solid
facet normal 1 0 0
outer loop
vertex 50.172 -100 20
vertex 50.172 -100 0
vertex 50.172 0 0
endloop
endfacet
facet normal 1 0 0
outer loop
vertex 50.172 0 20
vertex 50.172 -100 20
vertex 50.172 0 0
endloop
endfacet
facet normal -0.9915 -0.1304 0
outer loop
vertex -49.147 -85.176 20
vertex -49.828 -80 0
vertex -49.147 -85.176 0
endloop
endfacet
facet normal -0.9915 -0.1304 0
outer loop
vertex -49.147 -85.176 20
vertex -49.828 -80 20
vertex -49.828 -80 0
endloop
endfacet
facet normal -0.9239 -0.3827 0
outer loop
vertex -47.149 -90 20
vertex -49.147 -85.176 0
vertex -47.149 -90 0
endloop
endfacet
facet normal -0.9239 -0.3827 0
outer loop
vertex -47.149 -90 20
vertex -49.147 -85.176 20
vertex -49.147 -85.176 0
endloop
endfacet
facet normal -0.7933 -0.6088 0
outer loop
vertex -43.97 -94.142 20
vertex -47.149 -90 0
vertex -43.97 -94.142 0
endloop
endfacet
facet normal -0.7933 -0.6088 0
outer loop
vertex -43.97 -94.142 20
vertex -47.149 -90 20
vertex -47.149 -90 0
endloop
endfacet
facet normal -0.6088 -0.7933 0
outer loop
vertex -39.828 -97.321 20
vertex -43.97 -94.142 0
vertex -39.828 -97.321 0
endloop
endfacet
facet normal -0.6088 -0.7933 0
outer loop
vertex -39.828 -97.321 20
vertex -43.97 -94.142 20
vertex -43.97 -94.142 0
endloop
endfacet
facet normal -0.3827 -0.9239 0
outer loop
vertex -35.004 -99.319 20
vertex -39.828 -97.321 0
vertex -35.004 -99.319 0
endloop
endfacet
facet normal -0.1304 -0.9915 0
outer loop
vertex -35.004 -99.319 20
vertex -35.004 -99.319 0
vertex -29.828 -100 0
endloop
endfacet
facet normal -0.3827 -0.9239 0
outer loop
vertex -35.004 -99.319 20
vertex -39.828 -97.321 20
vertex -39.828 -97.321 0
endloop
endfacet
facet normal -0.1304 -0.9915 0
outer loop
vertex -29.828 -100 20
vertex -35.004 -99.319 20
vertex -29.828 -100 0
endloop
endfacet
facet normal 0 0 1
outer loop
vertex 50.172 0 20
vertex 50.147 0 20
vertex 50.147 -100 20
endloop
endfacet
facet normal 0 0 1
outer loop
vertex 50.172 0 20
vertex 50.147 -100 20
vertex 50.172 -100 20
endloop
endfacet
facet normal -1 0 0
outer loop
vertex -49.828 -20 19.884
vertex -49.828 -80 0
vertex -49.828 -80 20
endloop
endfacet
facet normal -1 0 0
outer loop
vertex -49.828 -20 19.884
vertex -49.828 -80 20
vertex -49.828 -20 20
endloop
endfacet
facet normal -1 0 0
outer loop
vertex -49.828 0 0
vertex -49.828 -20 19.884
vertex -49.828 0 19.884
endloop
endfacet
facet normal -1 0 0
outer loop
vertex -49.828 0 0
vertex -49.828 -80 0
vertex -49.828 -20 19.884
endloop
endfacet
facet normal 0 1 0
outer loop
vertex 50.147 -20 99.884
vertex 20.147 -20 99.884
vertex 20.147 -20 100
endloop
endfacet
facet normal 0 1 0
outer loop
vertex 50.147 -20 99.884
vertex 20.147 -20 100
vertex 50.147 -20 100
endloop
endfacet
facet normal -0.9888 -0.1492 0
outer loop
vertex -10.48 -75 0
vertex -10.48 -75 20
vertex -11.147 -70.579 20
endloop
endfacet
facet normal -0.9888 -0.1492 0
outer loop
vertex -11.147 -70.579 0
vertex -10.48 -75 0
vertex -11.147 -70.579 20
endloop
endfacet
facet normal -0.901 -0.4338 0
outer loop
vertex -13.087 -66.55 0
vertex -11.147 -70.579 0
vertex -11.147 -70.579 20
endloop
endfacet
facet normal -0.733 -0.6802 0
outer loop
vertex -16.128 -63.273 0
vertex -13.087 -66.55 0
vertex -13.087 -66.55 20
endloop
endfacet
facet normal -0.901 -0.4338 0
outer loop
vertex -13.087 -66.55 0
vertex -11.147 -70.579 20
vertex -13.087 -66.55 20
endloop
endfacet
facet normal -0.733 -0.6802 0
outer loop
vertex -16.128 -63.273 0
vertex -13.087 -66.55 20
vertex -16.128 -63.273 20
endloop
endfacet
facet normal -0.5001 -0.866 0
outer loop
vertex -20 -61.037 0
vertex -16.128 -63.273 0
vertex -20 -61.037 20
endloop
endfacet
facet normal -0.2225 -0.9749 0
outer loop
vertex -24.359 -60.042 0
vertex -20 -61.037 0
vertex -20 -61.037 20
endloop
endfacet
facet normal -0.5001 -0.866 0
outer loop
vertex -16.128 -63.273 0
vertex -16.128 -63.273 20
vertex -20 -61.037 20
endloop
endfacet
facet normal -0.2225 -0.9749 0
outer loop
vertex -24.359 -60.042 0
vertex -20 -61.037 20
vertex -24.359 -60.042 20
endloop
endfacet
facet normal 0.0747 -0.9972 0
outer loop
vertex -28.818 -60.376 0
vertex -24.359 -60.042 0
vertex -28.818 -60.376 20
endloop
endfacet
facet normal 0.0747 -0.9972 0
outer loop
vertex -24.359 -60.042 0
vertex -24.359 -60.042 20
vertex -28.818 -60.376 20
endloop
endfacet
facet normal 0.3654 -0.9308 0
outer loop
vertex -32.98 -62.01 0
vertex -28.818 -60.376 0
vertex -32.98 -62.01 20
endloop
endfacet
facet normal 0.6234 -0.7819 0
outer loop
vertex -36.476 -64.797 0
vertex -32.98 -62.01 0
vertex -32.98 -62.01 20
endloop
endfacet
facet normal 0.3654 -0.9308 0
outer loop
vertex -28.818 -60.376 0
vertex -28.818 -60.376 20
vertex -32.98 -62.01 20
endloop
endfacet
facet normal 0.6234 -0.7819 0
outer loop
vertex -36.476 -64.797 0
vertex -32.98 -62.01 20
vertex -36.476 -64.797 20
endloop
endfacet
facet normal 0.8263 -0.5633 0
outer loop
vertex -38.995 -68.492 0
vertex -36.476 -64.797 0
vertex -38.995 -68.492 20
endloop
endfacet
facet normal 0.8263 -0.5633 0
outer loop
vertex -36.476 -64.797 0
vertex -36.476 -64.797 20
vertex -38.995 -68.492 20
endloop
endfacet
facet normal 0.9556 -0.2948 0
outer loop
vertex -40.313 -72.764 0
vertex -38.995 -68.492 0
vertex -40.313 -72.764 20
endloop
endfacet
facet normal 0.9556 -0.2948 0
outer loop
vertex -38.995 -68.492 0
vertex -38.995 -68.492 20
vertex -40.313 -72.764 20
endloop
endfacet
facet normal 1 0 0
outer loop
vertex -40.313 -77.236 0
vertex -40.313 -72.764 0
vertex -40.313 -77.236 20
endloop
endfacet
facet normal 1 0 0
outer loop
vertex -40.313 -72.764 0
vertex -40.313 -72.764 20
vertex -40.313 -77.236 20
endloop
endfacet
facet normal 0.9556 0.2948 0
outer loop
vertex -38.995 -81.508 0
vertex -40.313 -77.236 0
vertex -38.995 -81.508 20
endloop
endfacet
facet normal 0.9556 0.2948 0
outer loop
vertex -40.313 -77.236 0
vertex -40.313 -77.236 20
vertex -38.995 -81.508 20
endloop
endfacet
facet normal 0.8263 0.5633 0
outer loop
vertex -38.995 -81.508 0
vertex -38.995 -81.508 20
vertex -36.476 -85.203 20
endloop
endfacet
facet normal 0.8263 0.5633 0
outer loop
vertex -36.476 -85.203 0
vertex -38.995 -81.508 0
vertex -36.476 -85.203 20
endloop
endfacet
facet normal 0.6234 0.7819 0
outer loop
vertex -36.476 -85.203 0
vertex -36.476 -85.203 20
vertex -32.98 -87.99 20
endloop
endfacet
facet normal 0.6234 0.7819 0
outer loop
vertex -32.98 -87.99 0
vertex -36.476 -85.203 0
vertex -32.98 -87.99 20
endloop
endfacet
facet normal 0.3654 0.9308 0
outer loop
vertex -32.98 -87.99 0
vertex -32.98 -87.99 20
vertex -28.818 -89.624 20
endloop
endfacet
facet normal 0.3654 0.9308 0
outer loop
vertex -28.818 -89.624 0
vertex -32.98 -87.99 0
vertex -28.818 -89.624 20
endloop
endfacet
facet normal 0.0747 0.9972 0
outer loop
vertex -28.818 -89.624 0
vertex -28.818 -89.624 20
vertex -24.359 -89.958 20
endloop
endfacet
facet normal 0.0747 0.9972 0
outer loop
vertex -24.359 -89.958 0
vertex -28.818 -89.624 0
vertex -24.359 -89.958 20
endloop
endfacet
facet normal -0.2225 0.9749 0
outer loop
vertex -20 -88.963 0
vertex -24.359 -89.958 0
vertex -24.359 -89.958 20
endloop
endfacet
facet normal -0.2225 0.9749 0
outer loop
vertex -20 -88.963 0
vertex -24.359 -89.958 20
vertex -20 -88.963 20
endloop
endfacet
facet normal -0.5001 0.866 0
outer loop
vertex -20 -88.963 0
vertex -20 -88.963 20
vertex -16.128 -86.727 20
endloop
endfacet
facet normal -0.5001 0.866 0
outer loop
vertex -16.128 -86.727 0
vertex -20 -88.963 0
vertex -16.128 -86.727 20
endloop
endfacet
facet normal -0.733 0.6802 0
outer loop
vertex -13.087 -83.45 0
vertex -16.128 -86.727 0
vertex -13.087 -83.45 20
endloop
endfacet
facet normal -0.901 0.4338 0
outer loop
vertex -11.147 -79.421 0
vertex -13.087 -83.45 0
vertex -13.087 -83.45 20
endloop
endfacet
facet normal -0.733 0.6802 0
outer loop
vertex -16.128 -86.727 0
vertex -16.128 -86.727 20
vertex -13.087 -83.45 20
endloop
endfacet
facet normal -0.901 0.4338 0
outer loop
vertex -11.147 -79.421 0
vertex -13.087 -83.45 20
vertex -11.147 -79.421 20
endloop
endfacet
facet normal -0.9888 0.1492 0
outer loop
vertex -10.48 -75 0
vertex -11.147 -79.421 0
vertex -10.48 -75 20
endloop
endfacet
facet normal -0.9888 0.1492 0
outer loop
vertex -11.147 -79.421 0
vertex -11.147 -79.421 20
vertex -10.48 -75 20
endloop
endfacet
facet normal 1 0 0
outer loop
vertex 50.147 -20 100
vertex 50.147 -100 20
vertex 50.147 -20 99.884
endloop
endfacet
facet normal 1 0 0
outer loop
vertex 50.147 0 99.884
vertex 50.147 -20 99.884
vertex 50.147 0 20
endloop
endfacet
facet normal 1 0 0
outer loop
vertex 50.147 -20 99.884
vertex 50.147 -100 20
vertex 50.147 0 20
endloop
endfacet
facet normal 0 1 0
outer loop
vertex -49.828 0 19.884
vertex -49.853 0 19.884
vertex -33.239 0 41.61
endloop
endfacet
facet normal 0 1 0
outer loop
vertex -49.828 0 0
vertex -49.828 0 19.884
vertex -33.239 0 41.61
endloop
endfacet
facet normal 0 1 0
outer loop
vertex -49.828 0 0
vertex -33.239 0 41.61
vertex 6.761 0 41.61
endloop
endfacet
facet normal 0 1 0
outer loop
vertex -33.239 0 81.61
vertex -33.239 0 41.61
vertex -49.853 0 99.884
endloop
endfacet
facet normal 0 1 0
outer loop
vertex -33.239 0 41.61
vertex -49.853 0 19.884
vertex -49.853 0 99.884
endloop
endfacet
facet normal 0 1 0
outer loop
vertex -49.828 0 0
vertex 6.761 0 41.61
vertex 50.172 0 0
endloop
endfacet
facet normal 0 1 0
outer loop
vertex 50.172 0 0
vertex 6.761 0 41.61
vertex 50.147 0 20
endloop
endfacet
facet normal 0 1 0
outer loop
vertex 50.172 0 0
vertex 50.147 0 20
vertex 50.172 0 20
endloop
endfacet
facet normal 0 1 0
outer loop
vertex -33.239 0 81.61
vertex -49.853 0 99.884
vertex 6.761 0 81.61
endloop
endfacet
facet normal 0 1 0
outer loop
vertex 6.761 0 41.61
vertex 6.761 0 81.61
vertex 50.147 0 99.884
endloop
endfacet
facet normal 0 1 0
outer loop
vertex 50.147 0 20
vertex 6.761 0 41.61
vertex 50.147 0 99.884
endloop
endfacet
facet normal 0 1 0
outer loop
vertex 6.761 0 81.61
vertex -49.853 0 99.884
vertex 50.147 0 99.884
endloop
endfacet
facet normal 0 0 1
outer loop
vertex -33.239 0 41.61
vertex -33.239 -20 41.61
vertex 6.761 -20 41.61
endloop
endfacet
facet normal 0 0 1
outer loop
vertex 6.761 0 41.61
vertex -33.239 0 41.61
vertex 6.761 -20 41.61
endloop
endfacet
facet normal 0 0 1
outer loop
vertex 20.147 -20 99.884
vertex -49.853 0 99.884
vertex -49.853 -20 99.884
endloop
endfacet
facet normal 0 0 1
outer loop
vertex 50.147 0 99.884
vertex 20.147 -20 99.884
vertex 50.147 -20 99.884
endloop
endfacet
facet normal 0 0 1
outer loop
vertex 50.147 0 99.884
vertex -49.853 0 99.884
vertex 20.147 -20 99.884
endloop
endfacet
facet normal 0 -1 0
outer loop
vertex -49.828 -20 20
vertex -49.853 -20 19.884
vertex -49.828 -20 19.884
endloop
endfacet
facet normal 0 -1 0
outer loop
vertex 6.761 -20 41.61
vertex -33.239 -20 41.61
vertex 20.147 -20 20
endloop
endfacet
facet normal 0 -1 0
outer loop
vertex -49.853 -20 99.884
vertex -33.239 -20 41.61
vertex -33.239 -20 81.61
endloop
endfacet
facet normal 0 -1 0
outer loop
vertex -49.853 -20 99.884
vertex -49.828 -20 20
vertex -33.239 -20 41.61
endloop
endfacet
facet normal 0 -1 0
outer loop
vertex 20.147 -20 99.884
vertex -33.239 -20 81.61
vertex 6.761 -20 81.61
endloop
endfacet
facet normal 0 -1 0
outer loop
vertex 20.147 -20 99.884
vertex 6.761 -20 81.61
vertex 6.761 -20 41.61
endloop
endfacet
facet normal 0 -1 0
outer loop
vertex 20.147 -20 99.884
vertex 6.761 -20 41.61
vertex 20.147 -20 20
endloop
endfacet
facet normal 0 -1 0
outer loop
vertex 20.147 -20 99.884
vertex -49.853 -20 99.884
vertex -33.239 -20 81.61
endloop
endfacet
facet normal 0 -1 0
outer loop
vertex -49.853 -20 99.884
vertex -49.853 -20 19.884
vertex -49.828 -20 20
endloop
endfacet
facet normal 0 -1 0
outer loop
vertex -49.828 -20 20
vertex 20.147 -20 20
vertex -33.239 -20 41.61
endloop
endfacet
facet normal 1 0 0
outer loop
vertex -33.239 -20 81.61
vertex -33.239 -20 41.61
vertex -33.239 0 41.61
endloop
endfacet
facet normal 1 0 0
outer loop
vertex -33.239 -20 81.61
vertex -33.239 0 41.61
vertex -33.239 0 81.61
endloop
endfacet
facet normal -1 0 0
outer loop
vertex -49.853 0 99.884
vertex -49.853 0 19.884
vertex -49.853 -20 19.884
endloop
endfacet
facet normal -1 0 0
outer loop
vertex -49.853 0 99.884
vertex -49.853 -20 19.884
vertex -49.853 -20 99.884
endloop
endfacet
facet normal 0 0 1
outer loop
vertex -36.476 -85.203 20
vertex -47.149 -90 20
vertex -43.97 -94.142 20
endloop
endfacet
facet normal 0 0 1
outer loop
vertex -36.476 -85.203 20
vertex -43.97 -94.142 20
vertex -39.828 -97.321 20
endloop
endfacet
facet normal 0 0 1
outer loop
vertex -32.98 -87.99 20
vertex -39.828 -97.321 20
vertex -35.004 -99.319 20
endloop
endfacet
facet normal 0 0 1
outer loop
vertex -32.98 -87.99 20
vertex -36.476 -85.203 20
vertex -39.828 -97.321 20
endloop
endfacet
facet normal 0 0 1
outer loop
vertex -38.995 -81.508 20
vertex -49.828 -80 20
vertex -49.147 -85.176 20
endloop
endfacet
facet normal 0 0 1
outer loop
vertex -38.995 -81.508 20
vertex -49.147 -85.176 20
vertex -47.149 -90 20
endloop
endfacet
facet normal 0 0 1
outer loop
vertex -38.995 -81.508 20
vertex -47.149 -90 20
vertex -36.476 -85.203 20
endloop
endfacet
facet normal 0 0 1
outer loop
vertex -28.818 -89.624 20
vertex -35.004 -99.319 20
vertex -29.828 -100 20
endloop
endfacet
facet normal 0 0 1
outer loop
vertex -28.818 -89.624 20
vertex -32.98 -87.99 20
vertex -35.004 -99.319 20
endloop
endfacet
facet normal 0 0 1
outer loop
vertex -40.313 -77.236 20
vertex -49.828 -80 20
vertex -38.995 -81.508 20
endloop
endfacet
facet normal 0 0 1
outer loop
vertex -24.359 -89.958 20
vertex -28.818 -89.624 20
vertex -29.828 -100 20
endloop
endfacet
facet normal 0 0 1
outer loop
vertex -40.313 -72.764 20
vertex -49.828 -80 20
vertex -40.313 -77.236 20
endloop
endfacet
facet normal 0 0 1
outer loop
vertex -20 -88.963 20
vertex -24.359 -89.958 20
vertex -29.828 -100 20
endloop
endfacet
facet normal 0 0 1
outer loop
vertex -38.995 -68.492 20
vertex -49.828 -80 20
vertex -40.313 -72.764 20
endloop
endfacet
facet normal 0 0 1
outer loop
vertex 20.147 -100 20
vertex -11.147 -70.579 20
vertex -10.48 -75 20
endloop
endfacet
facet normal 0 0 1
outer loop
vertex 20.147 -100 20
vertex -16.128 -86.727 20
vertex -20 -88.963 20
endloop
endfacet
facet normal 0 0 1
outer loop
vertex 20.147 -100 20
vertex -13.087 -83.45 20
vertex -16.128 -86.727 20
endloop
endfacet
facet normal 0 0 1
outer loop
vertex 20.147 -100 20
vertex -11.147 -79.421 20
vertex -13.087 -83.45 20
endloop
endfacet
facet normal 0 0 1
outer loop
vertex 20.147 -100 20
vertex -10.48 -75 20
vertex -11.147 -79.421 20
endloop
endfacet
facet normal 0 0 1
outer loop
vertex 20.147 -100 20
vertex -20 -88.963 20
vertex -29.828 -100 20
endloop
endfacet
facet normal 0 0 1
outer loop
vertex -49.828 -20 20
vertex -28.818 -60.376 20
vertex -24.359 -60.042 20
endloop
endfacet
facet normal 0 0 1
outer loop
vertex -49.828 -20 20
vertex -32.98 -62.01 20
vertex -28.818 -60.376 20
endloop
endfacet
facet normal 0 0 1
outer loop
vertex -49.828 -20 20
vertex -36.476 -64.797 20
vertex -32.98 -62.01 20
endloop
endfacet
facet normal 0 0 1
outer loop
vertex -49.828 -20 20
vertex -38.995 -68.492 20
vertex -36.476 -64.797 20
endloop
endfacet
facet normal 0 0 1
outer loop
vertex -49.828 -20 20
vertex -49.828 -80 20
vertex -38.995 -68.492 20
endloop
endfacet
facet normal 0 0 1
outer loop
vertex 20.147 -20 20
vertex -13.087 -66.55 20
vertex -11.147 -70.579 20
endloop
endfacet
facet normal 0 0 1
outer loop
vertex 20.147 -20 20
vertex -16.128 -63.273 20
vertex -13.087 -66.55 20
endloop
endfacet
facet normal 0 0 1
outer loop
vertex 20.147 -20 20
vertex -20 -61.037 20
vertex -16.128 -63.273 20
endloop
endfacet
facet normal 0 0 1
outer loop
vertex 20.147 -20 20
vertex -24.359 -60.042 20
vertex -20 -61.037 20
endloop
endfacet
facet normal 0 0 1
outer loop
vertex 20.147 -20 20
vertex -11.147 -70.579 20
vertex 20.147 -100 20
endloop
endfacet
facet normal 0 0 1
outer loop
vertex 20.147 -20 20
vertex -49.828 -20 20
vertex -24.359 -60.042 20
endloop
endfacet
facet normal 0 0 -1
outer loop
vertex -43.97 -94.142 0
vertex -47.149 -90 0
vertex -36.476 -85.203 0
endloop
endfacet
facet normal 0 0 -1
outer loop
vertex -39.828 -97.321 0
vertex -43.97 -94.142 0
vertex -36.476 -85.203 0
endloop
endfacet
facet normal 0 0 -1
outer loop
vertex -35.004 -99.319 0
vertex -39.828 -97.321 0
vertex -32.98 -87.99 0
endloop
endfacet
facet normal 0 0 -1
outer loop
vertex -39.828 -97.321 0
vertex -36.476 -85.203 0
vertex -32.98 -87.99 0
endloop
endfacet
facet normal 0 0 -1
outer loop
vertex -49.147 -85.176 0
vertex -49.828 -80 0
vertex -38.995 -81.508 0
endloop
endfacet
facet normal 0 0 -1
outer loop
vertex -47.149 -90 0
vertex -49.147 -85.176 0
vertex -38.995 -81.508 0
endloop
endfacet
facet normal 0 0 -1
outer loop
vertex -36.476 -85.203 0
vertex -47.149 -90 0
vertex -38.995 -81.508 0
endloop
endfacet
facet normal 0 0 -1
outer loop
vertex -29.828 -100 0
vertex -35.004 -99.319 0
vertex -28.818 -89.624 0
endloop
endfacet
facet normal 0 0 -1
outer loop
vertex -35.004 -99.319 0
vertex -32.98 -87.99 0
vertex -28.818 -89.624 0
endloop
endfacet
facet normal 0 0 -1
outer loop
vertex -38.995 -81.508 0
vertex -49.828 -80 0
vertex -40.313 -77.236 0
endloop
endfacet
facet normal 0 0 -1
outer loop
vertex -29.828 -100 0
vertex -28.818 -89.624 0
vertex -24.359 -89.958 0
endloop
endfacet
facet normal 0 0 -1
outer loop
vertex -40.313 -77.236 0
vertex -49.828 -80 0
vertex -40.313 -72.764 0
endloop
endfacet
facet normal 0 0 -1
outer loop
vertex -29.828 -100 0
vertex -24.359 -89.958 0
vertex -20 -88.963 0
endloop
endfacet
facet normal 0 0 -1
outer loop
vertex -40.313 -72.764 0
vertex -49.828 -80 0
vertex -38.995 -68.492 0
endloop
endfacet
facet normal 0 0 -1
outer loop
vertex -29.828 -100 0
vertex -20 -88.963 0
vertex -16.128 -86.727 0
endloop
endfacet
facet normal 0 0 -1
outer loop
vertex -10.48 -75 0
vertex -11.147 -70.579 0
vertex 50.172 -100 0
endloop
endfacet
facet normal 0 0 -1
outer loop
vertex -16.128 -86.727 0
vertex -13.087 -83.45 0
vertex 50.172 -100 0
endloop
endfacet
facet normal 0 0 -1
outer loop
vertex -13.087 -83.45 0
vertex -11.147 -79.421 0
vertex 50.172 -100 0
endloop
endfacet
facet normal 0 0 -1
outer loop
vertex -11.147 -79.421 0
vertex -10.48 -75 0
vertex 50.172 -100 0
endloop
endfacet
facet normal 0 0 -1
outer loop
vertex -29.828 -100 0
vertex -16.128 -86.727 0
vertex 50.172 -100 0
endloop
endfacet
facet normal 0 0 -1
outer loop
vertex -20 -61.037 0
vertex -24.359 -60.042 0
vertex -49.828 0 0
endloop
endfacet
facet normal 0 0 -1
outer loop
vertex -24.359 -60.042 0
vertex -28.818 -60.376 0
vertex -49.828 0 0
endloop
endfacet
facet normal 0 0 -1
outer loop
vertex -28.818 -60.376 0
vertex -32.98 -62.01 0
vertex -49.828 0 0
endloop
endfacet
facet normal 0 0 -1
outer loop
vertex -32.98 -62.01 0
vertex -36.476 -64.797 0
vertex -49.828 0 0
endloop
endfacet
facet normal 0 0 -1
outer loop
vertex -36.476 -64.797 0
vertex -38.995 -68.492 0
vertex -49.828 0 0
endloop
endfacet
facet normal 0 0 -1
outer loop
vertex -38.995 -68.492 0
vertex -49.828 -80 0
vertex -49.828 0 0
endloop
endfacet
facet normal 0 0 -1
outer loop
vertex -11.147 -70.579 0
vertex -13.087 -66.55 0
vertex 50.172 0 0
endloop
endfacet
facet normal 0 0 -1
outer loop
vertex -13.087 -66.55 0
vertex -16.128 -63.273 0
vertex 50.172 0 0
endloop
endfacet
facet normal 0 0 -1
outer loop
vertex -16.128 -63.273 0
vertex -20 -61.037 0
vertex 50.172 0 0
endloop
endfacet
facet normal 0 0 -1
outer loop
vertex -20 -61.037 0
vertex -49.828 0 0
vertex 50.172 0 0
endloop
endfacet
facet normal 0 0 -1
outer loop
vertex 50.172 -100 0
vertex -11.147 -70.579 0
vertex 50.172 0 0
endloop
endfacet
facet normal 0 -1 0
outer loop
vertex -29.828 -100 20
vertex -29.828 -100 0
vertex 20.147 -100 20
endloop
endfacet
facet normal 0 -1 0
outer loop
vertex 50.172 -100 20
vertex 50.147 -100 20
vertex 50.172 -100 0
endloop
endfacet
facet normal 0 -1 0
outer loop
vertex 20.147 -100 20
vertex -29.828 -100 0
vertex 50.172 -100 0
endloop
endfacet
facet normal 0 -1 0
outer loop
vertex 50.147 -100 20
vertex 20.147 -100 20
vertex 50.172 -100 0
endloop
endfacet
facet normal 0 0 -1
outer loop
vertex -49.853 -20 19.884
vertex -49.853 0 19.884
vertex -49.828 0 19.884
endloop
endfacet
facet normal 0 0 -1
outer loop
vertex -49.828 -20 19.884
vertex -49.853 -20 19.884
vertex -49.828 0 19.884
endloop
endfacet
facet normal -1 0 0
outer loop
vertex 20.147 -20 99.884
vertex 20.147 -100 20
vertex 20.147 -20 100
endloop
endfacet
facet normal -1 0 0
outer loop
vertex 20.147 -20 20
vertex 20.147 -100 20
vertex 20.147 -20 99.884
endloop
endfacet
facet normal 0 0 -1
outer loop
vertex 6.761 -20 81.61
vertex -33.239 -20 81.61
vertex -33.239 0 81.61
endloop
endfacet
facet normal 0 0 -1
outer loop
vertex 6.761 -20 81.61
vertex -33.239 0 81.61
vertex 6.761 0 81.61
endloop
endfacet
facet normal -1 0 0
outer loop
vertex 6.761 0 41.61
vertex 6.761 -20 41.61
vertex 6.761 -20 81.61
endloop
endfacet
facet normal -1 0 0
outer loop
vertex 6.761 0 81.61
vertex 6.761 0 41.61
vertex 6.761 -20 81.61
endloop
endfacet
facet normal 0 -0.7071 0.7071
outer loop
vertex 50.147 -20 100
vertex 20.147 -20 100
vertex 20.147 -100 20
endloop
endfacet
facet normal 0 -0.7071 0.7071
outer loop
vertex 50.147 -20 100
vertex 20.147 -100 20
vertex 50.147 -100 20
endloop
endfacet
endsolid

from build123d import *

# Parameters (mm, degrees)
F0_W      = 100
F0_H      = 100
F1_DEPTH  = 20
F2_W      = 100
F2_H      = 80
F3_DEPTH  = 20
F4_W      = 30
F4_H      = 80
F5_DEPTH  = 80
F6_R      = 20
F7_R      = 15
F8_DEPTH  = 20
F9_W      = 40
F9_H      = 40
F10_DEPTH = 20
F11_SIZE  = 79.99999


# Not quite as in the source:
# - a fillet or chamfer is up to 0.001 mm smaller than in the source, because OpenCascade refuses the exact size


with BuildPart() as f1:
    # F0 (on Top) → F1 (new body)
    with BuildSketch(Plane.XY):
        with Locations((0.1719114778, -50)):
            Rectangle(F0_W, F0_H)
    extrude(amount=F1_DEPTH)

    # F2 (on Front) → F3 (join)
    with BuildSketch(Plane.XZ):
        with Locations((0.1466497779, 59.8839402659)):
            Rectangle(F2_W, F2_H)
    extrude(amount=F3_DEPTH)

    # F4 (on face) → F5 (join)
    with BuildSketch(Plane.XY.offset(20)):
        with Locations((35.1466497779, -60)):
            Rectangle(F4_W, F4_H)
    extrude(amount=F5_DEPTH)

    # F6
    f6_edges = [f1.edges().sort_by_distance(p)[0] for p in [
        (-49.828089, -100, 10),
    ]]
    fillet(f6_edges, radius=F6_R)

    # F7 (on face) → F8 (cut)
    with BuildSketch(Plane.XY.offset(20)):
        with Locations((-25.480100885, -75)):
            Circle(F7_R)
    extrude(amount=-F8_DEPTH, mode=Mode.SUBTRACT)

    # F9 (on face) → F10 (cut)
    with BuildSketch(Plane.XZ.offset(20)):
        with Locations((-13.2386269793, 61.6098302603)):
            Rectangle(F9_W, F9_H)
    extrude(amount=-F10_DEPTH, mode=Mode.SUBTRACT)

    # F11 (size 80 in the source; OpenCascade refuses exactly that, so slightly less here)
    f11_edges = [f1.edges().sort_by_distance(p)[0] for p in [
        (35.14665, -100, 100),
    ]]
    chamfer(f11_edges, length=F11_SIZE)


solid = f1.part
